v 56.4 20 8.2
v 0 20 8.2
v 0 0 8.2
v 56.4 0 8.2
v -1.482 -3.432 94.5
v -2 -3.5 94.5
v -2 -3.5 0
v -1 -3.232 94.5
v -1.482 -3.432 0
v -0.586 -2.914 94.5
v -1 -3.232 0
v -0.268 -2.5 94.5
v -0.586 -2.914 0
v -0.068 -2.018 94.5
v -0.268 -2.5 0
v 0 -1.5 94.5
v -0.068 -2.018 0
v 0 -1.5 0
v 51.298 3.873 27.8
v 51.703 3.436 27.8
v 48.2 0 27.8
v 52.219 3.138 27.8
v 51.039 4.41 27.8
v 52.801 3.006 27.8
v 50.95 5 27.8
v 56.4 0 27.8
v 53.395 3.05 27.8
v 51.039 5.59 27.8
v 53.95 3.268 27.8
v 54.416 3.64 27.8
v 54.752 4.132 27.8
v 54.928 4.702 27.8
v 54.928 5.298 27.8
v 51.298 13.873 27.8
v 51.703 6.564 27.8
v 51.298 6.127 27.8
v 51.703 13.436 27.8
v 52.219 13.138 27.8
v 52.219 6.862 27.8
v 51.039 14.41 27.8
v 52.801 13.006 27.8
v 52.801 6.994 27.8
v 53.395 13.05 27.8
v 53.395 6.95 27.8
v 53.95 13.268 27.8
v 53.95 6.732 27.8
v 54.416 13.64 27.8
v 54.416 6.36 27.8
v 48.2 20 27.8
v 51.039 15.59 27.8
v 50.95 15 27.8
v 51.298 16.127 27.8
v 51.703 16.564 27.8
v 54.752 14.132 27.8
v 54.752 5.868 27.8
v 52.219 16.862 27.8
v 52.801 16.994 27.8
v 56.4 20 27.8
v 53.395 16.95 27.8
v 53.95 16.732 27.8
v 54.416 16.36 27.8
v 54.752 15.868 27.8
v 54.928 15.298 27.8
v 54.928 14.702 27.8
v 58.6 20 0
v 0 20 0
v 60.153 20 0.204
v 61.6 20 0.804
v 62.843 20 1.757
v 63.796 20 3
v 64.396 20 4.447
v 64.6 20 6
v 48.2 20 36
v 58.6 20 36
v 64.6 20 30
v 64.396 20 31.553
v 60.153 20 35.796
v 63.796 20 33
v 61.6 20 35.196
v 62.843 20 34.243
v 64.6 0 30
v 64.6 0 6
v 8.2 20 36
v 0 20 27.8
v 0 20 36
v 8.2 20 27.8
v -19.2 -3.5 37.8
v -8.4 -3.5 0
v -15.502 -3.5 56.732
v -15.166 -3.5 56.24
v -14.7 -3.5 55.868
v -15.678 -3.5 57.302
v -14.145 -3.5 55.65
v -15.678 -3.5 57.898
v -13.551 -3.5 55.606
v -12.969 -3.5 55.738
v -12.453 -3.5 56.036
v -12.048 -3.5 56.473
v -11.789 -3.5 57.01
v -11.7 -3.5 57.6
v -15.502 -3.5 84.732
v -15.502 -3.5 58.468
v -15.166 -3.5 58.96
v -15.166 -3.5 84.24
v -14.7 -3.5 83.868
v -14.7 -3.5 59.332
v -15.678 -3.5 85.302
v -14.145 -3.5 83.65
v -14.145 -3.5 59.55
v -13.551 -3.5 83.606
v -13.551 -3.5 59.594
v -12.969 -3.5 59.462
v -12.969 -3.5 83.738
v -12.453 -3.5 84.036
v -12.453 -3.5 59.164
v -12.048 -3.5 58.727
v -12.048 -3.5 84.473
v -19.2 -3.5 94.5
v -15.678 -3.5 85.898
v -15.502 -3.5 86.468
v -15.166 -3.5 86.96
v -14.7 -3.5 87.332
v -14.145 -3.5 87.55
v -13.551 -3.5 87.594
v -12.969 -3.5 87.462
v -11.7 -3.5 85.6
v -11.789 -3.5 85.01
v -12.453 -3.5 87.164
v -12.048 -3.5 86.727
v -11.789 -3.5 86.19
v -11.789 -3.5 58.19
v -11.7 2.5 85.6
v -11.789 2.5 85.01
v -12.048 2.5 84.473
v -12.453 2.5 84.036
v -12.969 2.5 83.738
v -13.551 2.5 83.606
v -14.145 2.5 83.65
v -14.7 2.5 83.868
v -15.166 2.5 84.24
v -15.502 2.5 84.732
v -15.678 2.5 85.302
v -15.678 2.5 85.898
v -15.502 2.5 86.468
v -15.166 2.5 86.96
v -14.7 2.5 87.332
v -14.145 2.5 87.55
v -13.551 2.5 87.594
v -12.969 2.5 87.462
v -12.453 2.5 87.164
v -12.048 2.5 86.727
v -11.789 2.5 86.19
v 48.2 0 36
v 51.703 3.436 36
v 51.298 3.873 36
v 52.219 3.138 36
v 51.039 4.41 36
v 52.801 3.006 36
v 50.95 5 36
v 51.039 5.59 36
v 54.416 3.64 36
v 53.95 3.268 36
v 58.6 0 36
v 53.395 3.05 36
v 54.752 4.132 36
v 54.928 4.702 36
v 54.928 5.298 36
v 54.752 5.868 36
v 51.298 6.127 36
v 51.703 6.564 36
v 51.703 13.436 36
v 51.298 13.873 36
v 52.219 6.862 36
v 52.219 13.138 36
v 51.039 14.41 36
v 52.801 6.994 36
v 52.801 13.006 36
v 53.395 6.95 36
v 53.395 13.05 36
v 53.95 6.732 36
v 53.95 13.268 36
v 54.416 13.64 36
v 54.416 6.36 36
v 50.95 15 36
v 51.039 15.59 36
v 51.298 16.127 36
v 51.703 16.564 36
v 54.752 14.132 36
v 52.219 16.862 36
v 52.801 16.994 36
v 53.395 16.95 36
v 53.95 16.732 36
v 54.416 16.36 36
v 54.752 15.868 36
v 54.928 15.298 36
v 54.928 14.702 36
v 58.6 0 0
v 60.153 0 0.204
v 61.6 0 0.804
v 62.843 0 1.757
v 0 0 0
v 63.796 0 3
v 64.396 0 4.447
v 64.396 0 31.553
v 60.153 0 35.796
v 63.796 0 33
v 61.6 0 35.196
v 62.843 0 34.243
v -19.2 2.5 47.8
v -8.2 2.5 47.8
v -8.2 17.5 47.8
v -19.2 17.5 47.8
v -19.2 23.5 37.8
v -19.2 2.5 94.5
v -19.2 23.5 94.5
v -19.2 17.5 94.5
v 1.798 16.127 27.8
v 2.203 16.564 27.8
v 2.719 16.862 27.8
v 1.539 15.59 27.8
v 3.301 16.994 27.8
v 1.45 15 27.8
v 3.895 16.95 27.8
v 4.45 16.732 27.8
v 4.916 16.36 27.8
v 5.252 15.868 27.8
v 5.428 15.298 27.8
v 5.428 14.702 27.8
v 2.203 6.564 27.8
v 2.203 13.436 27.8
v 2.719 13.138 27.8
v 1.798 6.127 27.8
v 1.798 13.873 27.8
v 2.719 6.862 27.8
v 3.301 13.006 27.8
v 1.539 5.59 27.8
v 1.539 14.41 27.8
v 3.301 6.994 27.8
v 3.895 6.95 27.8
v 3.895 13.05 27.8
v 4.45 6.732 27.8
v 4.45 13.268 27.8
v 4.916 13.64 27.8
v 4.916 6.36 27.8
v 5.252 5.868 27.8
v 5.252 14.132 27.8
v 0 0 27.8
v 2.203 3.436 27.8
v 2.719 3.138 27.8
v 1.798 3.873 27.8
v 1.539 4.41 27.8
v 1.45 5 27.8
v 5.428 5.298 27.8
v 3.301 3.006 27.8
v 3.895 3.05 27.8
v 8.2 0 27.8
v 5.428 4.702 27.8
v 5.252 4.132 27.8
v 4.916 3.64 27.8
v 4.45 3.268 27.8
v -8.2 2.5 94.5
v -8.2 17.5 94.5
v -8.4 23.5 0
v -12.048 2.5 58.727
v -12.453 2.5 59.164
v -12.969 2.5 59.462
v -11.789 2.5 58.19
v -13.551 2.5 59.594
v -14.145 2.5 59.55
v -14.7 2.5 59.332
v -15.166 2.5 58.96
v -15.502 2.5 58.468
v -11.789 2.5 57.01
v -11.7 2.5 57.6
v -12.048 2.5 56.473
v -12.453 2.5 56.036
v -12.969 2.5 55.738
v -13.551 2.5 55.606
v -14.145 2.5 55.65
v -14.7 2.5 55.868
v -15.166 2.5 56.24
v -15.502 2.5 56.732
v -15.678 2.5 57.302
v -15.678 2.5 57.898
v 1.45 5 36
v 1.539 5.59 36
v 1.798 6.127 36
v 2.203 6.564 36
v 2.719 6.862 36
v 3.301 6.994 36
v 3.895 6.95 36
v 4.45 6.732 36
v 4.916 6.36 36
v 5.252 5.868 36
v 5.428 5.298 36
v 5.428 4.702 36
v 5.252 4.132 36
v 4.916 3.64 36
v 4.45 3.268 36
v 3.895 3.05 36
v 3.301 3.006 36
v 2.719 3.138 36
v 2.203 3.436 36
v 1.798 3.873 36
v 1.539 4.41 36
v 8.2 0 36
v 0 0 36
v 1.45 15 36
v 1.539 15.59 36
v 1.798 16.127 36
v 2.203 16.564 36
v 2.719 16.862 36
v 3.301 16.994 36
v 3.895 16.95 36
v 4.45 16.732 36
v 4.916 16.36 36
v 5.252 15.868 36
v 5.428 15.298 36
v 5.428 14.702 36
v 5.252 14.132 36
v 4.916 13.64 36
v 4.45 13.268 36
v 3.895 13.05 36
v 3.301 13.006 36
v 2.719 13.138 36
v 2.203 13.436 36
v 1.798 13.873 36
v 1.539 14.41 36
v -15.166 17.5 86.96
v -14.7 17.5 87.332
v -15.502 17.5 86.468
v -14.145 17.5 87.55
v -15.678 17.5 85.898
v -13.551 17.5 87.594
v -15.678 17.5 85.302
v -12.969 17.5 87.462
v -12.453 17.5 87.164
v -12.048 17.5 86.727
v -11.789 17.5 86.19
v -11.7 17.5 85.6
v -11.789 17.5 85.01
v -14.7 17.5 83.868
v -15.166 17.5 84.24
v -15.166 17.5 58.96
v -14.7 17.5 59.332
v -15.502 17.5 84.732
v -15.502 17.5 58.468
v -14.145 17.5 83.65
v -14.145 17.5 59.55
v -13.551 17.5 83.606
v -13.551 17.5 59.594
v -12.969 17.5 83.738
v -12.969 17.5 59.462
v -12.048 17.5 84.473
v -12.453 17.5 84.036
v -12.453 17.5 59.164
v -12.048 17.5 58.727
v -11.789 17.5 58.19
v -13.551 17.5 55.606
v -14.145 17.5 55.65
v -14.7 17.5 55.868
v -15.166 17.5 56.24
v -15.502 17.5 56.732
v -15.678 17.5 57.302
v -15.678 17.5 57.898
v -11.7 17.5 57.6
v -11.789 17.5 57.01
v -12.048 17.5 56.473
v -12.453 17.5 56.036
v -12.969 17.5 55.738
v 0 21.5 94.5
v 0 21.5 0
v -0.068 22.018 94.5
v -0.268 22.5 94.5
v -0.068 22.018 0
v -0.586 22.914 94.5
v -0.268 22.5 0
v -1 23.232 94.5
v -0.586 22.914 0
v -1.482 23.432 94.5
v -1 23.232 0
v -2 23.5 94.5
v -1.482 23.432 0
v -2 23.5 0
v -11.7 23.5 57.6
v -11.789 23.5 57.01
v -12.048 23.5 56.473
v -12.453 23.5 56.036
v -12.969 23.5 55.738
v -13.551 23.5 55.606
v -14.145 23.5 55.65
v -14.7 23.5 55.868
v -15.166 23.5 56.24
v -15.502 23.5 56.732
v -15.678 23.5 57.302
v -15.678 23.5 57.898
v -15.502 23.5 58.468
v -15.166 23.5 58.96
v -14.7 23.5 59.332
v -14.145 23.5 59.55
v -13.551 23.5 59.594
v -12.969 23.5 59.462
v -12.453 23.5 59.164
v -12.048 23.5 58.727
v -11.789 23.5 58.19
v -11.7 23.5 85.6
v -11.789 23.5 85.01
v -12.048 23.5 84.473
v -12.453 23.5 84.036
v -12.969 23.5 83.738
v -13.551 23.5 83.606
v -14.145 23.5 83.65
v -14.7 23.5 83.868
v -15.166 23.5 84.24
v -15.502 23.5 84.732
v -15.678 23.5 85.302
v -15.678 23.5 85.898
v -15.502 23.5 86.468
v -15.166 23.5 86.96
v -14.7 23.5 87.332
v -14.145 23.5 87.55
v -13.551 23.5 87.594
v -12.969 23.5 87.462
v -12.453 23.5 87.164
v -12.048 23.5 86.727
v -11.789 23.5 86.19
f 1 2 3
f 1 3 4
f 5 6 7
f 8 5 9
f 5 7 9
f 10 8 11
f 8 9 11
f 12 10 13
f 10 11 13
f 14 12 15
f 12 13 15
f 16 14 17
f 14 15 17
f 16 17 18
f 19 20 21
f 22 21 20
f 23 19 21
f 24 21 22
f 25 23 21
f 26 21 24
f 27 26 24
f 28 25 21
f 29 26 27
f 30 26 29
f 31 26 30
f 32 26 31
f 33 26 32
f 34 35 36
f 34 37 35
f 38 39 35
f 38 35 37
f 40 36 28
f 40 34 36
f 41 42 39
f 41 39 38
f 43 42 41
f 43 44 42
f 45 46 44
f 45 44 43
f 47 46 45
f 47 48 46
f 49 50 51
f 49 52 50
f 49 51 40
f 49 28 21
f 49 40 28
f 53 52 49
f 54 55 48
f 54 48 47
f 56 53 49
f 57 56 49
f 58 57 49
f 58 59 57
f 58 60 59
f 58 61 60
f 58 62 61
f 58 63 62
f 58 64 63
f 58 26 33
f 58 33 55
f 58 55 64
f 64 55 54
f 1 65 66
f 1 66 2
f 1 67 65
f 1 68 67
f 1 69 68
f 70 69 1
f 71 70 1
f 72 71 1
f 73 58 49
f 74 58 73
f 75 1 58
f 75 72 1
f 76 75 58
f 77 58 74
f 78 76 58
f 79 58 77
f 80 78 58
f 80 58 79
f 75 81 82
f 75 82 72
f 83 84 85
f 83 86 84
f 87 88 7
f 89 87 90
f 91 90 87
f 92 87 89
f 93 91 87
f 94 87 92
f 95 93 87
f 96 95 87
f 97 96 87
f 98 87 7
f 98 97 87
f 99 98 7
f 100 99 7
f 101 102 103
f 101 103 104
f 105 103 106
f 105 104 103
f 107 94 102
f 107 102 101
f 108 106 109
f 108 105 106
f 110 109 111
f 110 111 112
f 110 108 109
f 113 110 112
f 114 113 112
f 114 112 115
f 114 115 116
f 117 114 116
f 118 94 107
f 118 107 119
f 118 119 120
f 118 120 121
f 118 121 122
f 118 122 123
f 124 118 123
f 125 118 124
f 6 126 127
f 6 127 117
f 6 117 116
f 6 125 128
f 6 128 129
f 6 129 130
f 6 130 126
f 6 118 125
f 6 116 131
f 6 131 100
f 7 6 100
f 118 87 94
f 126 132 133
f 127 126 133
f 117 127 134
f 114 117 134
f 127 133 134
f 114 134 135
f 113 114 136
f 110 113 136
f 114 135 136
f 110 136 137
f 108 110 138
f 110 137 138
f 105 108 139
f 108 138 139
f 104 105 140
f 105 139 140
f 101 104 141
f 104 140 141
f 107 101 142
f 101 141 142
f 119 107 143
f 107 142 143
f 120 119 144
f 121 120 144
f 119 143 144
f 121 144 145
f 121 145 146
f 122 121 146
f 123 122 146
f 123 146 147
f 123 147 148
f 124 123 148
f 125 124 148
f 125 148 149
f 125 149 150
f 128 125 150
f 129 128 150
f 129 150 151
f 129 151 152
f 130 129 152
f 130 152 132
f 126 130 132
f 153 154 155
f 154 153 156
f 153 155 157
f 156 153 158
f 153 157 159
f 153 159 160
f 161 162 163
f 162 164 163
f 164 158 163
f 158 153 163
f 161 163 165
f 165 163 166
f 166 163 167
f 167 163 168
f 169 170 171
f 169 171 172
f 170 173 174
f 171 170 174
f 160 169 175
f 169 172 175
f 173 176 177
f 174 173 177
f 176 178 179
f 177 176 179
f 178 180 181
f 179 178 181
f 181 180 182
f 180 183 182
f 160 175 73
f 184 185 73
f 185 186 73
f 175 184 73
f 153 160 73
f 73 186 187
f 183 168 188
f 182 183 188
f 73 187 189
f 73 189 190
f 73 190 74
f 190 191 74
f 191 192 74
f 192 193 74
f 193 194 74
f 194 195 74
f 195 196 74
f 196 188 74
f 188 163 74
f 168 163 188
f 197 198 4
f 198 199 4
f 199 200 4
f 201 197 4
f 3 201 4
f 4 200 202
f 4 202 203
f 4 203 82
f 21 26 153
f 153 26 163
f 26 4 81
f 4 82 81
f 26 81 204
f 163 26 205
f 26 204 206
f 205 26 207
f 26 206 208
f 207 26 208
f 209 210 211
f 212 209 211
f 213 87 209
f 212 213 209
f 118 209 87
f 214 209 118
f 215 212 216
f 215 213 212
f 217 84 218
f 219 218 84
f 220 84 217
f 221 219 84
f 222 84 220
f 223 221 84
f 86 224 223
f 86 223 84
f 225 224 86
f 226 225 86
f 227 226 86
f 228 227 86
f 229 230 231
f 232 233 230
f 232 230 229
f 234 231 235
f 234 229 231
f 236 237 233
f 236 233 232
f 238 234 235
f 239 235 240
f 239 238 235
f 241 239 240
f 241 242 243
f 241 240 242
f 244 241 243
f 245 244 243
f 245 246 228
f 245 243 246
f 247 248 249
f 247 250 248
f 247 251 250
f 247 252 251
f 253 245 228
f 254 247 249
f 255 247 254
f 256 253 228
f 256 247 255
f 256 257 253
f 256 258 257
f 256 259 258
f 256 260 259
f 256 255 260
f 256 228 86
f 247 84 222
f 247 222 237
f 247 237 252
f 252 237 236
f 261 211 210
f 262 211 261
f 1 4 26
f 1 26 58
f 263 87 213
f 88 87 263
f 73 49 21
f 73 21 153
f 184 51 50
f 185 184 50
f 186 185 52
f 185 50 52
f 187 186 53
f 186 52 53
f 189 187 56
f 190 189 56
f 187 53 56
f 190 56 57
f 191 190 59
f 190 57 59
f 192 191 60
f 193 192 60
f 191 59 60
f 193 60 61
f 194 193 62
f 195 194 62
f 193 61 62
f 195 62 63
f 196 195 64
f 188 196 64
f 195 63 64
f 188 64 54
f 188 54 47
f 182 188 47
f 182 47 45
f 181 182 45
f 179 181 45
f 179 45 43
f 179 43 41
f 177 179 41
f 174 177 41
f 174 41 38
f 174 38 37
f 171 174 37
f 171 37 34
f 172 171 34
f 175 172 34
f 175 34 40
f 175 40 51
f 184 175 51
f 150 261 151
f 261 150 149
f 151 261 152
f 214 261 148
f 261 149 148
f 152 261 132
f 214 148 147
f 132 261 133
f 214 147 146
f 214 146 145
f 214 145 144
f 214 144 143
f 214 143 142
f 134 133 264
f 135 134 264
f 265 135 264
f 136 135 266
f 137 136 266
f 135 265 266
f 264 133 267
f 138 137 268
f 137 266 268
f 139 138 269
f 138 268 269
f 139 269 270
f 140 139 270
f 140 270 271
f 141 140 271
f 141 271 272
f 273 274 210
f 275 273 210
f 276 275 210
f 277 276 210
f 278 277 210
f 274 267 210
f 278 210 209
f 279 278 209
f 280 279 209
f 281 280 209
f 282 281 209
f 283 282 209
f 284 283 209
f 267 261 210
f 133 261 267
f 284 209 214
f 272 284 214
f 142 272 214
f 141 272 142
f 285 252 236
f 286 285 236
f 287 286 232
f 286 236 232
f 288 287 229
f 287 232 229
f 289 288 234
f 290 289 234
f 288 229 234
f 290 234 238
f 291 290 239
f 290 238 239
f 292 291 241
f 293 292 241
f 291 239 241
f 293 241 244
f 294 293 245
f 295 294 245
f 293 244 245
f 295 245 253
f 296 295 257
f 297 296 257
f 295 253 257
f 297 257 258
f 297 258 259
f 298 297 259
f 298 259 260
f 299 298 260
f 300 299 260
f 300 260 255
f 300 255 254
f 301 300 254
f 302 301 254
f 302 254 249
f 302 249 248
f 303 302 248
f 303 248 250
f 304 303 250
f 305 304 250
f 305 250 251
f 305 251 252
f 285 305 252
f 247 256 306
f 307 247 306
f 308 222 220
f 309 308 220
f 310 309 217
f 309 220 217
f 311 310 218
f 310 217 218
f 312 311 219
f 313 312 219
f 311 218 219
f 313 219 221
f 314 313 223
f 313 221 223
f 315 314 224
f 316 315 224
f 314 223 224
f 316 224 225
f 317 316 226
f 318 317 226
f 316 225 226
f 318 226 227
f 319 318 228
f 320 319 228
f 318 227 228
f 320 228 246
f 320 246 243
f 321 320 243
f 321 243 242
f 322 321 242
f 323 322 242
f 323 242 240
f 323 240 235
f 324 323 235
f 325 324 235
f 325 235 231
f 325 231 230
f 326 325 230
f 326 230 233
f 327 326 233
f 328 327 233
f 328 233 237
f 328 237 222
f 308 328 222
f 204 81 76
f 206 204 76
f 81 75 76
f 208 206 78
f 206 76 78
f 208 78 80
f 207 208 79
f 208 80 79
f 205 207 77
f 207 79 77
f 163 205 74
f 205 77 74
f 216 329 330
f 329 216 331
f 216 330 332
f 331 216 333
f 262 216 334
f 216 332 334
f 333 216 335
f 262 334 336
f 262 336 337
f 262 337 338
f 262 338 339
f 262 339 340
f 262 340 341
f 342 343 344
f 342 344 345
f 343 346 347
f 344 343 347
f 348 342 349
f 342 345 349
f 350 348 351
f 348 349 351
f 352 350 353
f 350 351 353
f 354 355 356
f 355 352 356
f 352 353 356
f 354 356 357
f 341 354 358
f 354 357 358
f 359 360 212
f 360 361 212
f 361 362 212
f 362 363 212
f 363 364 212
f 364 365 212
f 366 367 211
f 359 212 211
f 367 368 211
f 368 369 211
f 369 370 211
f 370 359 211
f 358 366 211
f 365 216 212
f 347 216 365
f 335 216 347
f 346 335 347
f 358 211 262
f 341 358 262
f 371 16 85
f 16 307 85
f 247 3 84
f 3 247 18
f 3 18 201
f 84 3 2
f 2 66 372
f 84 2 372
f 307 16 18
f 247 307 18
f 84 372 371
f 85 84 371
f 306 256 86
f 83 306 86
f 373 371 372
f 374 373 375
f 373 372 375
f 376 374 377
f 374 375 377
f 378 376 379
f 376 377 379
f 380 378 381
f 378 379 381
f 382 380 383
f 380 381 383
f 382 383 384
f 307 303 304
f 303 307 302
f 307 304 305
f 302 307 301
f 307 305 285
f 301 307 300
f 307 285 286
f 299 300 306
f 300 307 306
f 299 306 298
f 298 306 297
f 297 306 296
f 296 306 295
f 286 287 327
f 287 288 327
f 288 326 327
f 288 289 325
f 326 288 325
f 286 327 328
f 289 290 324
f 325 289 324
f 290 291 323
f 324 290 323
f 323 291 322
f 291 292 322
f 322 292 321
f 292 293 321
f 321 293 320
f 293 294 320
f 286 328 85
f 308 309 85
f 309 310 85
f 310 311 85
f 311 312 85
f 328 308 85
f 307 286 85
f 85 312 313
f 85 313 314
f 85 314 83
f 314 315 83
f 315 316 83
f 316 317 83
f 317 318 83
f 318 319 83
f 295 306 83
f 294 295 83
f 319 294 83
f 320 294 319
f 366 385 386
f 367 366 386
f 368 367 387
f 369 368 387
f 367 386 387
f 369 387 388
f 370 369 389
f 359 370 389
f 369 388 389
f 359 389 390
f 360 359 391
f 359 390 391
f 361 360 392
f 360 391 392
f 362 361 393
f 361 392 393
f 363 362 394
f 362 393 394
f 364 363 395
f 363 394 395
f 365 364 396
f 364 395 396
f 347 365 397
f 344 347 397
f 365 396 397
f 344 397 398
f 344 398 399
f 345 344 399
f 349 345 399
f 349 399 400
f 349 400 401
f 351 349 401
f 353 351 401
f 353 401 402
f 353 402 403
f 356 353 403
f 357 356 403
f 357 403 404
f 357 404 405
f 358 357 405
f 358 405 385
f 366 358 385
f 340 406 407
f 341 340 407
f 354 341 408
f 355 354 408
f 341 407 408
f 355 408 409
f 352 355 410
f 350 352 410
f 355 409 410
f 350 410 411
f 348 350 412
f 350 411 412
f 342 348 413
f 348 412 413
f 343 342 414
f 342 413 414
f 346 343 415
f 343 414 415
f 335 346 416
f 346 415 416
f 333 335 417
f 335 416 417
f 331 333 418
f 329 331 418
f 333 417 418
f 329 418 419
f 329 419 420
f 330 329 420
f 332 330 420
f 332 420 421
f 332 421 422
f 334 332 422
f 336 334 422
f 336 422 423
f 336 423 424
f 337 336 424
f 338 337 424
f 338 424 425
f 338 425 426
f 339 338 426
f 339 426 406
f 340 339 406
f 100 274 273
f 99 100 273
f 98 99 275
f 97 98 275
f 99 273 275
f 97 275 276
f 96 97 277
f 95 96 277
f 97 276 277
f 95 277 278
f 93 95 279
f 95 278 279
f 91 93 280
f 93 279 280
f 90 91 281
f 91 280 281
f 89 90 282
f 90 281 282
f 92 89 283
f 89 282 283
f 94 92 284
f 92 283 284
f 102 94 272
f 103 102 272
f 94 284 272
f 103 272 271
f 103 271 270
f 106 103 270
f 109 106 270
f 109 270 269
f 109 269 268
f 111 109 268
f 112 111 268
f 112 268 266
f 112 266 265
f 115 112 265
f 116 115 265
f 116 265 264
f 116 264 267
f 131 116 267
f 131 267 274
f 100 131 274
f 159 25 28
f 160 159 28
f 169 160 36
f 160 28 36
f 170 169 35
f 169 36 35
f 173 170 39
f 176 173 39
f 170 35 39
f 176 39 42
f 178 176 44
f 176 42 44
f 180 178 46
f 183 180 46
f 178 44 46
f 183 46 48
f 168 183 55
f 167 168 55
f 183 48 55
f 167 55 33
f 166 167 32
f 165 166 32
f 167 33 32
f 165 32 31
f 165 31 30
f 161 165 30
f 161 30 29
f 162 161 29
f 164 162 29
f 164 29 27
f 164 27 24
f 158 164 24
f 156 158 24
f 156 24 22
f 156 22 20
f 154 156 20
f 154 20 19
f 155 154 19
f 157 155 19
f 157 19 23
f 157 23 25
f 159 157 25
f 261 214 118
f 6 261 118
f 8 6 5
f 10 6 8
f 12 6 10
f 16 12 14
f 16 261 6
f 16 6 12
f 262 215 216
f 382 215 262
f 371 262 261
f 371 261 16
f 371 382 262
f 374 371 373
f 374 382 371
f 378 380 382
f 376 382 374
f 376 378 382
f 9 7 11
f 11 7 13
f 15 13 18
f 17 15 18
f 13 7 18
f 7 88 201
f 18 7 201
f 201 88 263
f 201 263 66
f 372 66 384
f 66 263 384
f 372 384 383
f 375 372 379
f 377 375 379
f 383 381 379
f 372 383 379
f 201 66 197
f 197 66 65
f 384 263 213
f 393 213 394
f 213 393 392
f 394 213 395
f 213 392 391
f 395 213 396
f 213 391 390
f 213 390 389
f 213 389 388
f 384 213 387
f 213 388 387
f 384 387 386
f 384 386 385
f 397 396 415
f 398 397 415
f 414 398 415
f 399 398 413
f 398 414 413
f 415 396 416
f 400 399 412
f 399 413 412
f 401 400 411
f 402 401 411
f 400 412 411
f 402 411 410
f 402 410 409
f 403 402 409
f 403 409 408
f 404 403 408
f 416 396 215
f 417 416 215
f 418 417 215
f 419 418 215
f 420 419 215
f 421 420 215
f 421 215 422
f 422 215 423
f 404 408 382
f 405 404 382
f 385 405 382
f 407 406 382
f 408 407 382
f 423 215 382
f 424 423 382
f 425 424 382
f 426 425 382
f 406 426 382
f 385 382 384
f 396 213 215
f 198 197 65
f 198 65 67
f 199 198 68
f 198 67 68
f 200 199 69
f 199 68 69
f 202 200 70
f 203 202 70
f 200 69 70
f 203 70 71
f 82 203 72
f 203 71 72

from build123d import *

# Parameters (mm, degrees)
SCHIZZO1_W                    = 64.6
SCHIZZO1_H                    = 20
ESTRUSIONE_ESTRUSIONE1_DEPTH  = 8.2
SCHIZZO2_W                    = 8.2
SCHIZZO2_H                    = 20
ESTRUSIONE_ESTRUSIONE2_DEPTH  = 27.8
SCHIZZO3_W                    = 8.2
SCHIZZO3_H                    = 20
ESTRUSIONE_ESTRUSIONE3_DEPTH  = 27.8
SCHIZZO4_W                    = 8.2
SCHIZZO4_H                    = 20
ESTRUSIONE_ESTRUSIONE4_DEPTH  = 8.2
SCHIZZO5_W                    = 36
SCHIZZO5_H                    = 20
ESTRUSIONE_ESTRUSIONE5_DEPTH  = 8.2
SCHIZZO6_W                    = 48.2
SCHIZZO6_H                    = 19.6
TAGLIO_ESTRUSIONE1_DEPTH      = 77.610443152
F_4_0_4_DIAMETER_HOLE2_D      = 4
F_4_0_4_DIAMETER_HOLE2_DEPTH  = 8.2
RACCORDO3_R                   = 6
SCHIZZO15_W                   = 8.2
SCHIZZO15_H                   = 36
ESTRUSIONE_ESTRUSIONE7_DEPTH  = 3.5
SCHIZZO16_W                   = 8.2
SCHIZZO16_H                   = 36
ESTRUSIONE_ESTRUSIONE8_DEPTH  = 3.5
SCHIZZO17_W                   = 36
SCHIZZO17_H                   = 6
ESTRUSIONE_ESTRUSIONE9_DEPTH  = 11
RACCORDO6_R                   = 2
ESTRUSIONE_ESTRUSIONE11_DEPTH = 58.5
F_4_0_4_DIAMETER_HOLE1_D      = 4
SKETCH1_W                     = 47.8
SKETCH1_H                     = 27
CUT_EXTRUDE1_DEPTH            = 11
SKETCH3_W                     = 10
SKETCH3_H                     = 27
BOSS_EXTRUDE1_DEPTH           = 11
CHAMFER1_SIZE                 = 11
CHAMFER1_SIZE_2               = 38.5


with BuildPart() as part:
    # Schizzo1 → Estrusione-Estrusione1 (new body)
    with BuildSketch(Plane.XY):
        with Locations((32.3, 10)):
            Rectangle(SCHIZZO1_W, SCHIZZO1_H)
    extrude(amount=ESTRUSIONE_ESTRUSIONE1_DEPTH)

    # Schizzo2 → Estrusione-Estrusione2 (add)
    with BuildSketch(Plane.XY.offset(8.2)):
        with Locations((4.1, 10)):
            Rectangle(SCHIZZO2_W, SCHIZZO2_H)
    extrude(amount=ESTRUSIONE_ESTRUSIONE2_DEPTH)

    # Schizzo3 → Estrusione-Estrusione3 (add)
    with BuildSketch(Plane.XY.offset(8.2)):
        with Locations((60.5, 10)):
            Rectangle(SCHIZZO3_W, SCHIZZO3_H)
    extrude(amount=ESTRUSIONE_ESTRUSIONE3_DEPTH)

    # Schizzo4 → Estrusione-Estrusione4 (add)
    with BuildSketch(Plane.ZY.offset(-56.4)):
        with Locations((31.9, 10)):
            Rectangle(SCHIZZO4_W, SCHIZZO4_H)
    extrude(amount=ESTRUSIONE_ESTRUSIONE4_DEPTH)

    # Schizzo5 → Estrusione-Estrusione5 (add)
    with BuildSketch(Plane.ZY):
        with Locations((18, 10)):
            Rectangle(SCHIZZO5_W, SCHIZZO5_H)
    extrude(amount=ESTRUSIONE_ESTRUSIONE5_DEPTH)

    # Schizzo6 → Taglio-Estrusione1 (cut, through all)
    with BuildSketch(Plane.XZ):
        with Locations((24.1, 18)):
            Rectangle(SCHIZZO6_W, SCHIZZO6_H)
    extrude(amount=-TAGLIO_ESTRUSIONE1_DEPTH, mode=Mode.SUBTRACT)

    # Ø4.0 (4) Diameter Hole2
    with Locations(Plane.XY.offset(36)):
        with Locations((52.95, 5), (3.45, 5), (3.45, 15), (52.95, 15)):
            Hole(F_4_0_4_DIAMETER_HOLE2_D / 2, depth=F_4_0_4_DIAMETER_HOLE2_DEPTH)

    # Raccordo3
    raccordo3_edges = [part.edges().sort_by_distance(p)[0] for p in [
        (64.6, 10, 36),
        (64.6, 10, 0),
    ]]
    fillet(raccordo3_edges, radius=RACCORDO3_R)

    # Schizzo15 → Estrusione-Estrusione7 (add)
    with BuildSketch(Plane.XZ):
        with Locations((-4.1, 18)):
            Rectangle(SCHIZZO15_W, SCHIZZO15_H)
    extrude(amount=ESTRUSIONE_ESTRUSIONE7_DEPTH)

    # Schizzo16 → Estrusione-Estrusione8 (add)
    with BuildSketch(Plane(origin=(0, 20, 0), x_dir=(1, 0, 0), z_dir=(0, 1, 0))):
        with Locations((-4.1, -18)):
            Rectangle(SCHIZZO16_W, SCHIZZO16_H)
    extrude(amount=ESTRUSIONE_ESTRUSIONE8_DEPTH)

    # Schizzo17 → Estrusione-Estrusione9 (add)
    with BuildSketch(Plane.ZY.offset(8.2)):
        with Locations((18, 20.5)):
            Rectangle(SCHIZZO17_W, SCHIZZO17_H)
        with Locations((18, -0.5)):
            Rectangle(SCHIZZO17_W, SCHIZZO17_H)
    extrude(amount=ESTRUSIONE_ESTRUSIONE9_DEPTH)

    # Raccordo6
    raccordo6_edges = [part.edges().sort_by_distance(p)[0] for p in [
        (0, -3.5, 18),
        (0, 23.5, 18),
    ]]
    fillet(raccordo6_edges, radius=RACCORDO6_R)

    # Schizzo24 → Estrusione-Estrusione11 (add)
    with BuildSketch(Plane.XY.offset(36)):
        with BuildLine():
            Line((-2, 23.5), (-19.2, 23.5))
            Line((-19.2, 23.5), (-19.2, 17.5))
            Line((-19.2, 17.5), (-8.2, 17.5))
            Line((-8.2, 17.5), (-8.2, 2.5))
            Line((-8.2, 2.5), (-19.2, 2.5))
            Line((-19.2, 2.5), (-19.2, -3.5))
            Line((-19.2, -3.5), (-2, -3.5))
            ThreePointArc((-2, -3.5), (-0.585786438, -2.914213562), (0, -1.5))
            Line((0, -1.5), (0, 21.5))
            ThreePointArc((0, 21.5), (-0.585786438, 22.914213562), (-2, 23.5))
        make_face()
    extrude(amount=ESTRUSIONE_ESTRUSIONE11_DEPTH)

    # Ø4.0 (4) Diameter Hole1 (through all)
    with Locations(Plane(origin=(0, -3.5, 0), x_dir=(-1, 0, 0), z_dir=(0, -1, 0))):
        with Locations((13.7, -85.6), (13.7, -57.6)):
            Hole(F_4_0_4_DIAMETER_HOLE1_D / 2)

    # Sketch1 → Cut-Extrude1 (cut)
    with BuildSketch(Plane.ZY.offset(19.2)):
        with Locations((23.9, 10)):
            Rectangle(SKETCH1_W, SKETCH1_H)
    extrude(amount=-CUT_EXTRUDE1_DEPTH, mode=Mode.SUBTRACT)

    # Sketch3 → Boss-Extrude1 (add)
    with BuildSketch(Plane.ZY.offset(8.2)):
        with Locations((42.8, 10)):
            Rectangle(SKETCH3_W, SKETCH3_H)
    extrude(amount=BOSS_EXTRUDE1_DEPTH)

    # Chamfer1
    # the kernel refuses this chamfer: 38.5, 11 mm, written as the material it adds along each edge
    with BuildSketch(Plane(origin=(-8.2, -3.5, 37.8), x_dir=(-0.9917027448815273, 0, 0.1285521909359956), z_dir=(0, 1, 0))) as chamfer1_piece_1_section:
        Polygon((CHAMFER1_SIZE * 0.991702744882, -CHAMFER1_SIZE * 0.128552190936), (-CHAMFER1_SIZE_2 * 0.128552190936, -CHAMFER1_SIZE_2 * 0.991702744882), (0, 0), align=None)
    chamfer1_piece_1 = extrude(amount=27, mode=Mode.PRIVATE)
    chamfer1_piece_1 = split(chamfer1_piece_1, bisect_by=Plane(origin=(-11.867857143, 10, 0), z_dir=(0, 0, 1)), keep=Keep.TOP, mode=Mode.PRIVATE)
    add(chamfer1_piece_1)


solid = part.part
